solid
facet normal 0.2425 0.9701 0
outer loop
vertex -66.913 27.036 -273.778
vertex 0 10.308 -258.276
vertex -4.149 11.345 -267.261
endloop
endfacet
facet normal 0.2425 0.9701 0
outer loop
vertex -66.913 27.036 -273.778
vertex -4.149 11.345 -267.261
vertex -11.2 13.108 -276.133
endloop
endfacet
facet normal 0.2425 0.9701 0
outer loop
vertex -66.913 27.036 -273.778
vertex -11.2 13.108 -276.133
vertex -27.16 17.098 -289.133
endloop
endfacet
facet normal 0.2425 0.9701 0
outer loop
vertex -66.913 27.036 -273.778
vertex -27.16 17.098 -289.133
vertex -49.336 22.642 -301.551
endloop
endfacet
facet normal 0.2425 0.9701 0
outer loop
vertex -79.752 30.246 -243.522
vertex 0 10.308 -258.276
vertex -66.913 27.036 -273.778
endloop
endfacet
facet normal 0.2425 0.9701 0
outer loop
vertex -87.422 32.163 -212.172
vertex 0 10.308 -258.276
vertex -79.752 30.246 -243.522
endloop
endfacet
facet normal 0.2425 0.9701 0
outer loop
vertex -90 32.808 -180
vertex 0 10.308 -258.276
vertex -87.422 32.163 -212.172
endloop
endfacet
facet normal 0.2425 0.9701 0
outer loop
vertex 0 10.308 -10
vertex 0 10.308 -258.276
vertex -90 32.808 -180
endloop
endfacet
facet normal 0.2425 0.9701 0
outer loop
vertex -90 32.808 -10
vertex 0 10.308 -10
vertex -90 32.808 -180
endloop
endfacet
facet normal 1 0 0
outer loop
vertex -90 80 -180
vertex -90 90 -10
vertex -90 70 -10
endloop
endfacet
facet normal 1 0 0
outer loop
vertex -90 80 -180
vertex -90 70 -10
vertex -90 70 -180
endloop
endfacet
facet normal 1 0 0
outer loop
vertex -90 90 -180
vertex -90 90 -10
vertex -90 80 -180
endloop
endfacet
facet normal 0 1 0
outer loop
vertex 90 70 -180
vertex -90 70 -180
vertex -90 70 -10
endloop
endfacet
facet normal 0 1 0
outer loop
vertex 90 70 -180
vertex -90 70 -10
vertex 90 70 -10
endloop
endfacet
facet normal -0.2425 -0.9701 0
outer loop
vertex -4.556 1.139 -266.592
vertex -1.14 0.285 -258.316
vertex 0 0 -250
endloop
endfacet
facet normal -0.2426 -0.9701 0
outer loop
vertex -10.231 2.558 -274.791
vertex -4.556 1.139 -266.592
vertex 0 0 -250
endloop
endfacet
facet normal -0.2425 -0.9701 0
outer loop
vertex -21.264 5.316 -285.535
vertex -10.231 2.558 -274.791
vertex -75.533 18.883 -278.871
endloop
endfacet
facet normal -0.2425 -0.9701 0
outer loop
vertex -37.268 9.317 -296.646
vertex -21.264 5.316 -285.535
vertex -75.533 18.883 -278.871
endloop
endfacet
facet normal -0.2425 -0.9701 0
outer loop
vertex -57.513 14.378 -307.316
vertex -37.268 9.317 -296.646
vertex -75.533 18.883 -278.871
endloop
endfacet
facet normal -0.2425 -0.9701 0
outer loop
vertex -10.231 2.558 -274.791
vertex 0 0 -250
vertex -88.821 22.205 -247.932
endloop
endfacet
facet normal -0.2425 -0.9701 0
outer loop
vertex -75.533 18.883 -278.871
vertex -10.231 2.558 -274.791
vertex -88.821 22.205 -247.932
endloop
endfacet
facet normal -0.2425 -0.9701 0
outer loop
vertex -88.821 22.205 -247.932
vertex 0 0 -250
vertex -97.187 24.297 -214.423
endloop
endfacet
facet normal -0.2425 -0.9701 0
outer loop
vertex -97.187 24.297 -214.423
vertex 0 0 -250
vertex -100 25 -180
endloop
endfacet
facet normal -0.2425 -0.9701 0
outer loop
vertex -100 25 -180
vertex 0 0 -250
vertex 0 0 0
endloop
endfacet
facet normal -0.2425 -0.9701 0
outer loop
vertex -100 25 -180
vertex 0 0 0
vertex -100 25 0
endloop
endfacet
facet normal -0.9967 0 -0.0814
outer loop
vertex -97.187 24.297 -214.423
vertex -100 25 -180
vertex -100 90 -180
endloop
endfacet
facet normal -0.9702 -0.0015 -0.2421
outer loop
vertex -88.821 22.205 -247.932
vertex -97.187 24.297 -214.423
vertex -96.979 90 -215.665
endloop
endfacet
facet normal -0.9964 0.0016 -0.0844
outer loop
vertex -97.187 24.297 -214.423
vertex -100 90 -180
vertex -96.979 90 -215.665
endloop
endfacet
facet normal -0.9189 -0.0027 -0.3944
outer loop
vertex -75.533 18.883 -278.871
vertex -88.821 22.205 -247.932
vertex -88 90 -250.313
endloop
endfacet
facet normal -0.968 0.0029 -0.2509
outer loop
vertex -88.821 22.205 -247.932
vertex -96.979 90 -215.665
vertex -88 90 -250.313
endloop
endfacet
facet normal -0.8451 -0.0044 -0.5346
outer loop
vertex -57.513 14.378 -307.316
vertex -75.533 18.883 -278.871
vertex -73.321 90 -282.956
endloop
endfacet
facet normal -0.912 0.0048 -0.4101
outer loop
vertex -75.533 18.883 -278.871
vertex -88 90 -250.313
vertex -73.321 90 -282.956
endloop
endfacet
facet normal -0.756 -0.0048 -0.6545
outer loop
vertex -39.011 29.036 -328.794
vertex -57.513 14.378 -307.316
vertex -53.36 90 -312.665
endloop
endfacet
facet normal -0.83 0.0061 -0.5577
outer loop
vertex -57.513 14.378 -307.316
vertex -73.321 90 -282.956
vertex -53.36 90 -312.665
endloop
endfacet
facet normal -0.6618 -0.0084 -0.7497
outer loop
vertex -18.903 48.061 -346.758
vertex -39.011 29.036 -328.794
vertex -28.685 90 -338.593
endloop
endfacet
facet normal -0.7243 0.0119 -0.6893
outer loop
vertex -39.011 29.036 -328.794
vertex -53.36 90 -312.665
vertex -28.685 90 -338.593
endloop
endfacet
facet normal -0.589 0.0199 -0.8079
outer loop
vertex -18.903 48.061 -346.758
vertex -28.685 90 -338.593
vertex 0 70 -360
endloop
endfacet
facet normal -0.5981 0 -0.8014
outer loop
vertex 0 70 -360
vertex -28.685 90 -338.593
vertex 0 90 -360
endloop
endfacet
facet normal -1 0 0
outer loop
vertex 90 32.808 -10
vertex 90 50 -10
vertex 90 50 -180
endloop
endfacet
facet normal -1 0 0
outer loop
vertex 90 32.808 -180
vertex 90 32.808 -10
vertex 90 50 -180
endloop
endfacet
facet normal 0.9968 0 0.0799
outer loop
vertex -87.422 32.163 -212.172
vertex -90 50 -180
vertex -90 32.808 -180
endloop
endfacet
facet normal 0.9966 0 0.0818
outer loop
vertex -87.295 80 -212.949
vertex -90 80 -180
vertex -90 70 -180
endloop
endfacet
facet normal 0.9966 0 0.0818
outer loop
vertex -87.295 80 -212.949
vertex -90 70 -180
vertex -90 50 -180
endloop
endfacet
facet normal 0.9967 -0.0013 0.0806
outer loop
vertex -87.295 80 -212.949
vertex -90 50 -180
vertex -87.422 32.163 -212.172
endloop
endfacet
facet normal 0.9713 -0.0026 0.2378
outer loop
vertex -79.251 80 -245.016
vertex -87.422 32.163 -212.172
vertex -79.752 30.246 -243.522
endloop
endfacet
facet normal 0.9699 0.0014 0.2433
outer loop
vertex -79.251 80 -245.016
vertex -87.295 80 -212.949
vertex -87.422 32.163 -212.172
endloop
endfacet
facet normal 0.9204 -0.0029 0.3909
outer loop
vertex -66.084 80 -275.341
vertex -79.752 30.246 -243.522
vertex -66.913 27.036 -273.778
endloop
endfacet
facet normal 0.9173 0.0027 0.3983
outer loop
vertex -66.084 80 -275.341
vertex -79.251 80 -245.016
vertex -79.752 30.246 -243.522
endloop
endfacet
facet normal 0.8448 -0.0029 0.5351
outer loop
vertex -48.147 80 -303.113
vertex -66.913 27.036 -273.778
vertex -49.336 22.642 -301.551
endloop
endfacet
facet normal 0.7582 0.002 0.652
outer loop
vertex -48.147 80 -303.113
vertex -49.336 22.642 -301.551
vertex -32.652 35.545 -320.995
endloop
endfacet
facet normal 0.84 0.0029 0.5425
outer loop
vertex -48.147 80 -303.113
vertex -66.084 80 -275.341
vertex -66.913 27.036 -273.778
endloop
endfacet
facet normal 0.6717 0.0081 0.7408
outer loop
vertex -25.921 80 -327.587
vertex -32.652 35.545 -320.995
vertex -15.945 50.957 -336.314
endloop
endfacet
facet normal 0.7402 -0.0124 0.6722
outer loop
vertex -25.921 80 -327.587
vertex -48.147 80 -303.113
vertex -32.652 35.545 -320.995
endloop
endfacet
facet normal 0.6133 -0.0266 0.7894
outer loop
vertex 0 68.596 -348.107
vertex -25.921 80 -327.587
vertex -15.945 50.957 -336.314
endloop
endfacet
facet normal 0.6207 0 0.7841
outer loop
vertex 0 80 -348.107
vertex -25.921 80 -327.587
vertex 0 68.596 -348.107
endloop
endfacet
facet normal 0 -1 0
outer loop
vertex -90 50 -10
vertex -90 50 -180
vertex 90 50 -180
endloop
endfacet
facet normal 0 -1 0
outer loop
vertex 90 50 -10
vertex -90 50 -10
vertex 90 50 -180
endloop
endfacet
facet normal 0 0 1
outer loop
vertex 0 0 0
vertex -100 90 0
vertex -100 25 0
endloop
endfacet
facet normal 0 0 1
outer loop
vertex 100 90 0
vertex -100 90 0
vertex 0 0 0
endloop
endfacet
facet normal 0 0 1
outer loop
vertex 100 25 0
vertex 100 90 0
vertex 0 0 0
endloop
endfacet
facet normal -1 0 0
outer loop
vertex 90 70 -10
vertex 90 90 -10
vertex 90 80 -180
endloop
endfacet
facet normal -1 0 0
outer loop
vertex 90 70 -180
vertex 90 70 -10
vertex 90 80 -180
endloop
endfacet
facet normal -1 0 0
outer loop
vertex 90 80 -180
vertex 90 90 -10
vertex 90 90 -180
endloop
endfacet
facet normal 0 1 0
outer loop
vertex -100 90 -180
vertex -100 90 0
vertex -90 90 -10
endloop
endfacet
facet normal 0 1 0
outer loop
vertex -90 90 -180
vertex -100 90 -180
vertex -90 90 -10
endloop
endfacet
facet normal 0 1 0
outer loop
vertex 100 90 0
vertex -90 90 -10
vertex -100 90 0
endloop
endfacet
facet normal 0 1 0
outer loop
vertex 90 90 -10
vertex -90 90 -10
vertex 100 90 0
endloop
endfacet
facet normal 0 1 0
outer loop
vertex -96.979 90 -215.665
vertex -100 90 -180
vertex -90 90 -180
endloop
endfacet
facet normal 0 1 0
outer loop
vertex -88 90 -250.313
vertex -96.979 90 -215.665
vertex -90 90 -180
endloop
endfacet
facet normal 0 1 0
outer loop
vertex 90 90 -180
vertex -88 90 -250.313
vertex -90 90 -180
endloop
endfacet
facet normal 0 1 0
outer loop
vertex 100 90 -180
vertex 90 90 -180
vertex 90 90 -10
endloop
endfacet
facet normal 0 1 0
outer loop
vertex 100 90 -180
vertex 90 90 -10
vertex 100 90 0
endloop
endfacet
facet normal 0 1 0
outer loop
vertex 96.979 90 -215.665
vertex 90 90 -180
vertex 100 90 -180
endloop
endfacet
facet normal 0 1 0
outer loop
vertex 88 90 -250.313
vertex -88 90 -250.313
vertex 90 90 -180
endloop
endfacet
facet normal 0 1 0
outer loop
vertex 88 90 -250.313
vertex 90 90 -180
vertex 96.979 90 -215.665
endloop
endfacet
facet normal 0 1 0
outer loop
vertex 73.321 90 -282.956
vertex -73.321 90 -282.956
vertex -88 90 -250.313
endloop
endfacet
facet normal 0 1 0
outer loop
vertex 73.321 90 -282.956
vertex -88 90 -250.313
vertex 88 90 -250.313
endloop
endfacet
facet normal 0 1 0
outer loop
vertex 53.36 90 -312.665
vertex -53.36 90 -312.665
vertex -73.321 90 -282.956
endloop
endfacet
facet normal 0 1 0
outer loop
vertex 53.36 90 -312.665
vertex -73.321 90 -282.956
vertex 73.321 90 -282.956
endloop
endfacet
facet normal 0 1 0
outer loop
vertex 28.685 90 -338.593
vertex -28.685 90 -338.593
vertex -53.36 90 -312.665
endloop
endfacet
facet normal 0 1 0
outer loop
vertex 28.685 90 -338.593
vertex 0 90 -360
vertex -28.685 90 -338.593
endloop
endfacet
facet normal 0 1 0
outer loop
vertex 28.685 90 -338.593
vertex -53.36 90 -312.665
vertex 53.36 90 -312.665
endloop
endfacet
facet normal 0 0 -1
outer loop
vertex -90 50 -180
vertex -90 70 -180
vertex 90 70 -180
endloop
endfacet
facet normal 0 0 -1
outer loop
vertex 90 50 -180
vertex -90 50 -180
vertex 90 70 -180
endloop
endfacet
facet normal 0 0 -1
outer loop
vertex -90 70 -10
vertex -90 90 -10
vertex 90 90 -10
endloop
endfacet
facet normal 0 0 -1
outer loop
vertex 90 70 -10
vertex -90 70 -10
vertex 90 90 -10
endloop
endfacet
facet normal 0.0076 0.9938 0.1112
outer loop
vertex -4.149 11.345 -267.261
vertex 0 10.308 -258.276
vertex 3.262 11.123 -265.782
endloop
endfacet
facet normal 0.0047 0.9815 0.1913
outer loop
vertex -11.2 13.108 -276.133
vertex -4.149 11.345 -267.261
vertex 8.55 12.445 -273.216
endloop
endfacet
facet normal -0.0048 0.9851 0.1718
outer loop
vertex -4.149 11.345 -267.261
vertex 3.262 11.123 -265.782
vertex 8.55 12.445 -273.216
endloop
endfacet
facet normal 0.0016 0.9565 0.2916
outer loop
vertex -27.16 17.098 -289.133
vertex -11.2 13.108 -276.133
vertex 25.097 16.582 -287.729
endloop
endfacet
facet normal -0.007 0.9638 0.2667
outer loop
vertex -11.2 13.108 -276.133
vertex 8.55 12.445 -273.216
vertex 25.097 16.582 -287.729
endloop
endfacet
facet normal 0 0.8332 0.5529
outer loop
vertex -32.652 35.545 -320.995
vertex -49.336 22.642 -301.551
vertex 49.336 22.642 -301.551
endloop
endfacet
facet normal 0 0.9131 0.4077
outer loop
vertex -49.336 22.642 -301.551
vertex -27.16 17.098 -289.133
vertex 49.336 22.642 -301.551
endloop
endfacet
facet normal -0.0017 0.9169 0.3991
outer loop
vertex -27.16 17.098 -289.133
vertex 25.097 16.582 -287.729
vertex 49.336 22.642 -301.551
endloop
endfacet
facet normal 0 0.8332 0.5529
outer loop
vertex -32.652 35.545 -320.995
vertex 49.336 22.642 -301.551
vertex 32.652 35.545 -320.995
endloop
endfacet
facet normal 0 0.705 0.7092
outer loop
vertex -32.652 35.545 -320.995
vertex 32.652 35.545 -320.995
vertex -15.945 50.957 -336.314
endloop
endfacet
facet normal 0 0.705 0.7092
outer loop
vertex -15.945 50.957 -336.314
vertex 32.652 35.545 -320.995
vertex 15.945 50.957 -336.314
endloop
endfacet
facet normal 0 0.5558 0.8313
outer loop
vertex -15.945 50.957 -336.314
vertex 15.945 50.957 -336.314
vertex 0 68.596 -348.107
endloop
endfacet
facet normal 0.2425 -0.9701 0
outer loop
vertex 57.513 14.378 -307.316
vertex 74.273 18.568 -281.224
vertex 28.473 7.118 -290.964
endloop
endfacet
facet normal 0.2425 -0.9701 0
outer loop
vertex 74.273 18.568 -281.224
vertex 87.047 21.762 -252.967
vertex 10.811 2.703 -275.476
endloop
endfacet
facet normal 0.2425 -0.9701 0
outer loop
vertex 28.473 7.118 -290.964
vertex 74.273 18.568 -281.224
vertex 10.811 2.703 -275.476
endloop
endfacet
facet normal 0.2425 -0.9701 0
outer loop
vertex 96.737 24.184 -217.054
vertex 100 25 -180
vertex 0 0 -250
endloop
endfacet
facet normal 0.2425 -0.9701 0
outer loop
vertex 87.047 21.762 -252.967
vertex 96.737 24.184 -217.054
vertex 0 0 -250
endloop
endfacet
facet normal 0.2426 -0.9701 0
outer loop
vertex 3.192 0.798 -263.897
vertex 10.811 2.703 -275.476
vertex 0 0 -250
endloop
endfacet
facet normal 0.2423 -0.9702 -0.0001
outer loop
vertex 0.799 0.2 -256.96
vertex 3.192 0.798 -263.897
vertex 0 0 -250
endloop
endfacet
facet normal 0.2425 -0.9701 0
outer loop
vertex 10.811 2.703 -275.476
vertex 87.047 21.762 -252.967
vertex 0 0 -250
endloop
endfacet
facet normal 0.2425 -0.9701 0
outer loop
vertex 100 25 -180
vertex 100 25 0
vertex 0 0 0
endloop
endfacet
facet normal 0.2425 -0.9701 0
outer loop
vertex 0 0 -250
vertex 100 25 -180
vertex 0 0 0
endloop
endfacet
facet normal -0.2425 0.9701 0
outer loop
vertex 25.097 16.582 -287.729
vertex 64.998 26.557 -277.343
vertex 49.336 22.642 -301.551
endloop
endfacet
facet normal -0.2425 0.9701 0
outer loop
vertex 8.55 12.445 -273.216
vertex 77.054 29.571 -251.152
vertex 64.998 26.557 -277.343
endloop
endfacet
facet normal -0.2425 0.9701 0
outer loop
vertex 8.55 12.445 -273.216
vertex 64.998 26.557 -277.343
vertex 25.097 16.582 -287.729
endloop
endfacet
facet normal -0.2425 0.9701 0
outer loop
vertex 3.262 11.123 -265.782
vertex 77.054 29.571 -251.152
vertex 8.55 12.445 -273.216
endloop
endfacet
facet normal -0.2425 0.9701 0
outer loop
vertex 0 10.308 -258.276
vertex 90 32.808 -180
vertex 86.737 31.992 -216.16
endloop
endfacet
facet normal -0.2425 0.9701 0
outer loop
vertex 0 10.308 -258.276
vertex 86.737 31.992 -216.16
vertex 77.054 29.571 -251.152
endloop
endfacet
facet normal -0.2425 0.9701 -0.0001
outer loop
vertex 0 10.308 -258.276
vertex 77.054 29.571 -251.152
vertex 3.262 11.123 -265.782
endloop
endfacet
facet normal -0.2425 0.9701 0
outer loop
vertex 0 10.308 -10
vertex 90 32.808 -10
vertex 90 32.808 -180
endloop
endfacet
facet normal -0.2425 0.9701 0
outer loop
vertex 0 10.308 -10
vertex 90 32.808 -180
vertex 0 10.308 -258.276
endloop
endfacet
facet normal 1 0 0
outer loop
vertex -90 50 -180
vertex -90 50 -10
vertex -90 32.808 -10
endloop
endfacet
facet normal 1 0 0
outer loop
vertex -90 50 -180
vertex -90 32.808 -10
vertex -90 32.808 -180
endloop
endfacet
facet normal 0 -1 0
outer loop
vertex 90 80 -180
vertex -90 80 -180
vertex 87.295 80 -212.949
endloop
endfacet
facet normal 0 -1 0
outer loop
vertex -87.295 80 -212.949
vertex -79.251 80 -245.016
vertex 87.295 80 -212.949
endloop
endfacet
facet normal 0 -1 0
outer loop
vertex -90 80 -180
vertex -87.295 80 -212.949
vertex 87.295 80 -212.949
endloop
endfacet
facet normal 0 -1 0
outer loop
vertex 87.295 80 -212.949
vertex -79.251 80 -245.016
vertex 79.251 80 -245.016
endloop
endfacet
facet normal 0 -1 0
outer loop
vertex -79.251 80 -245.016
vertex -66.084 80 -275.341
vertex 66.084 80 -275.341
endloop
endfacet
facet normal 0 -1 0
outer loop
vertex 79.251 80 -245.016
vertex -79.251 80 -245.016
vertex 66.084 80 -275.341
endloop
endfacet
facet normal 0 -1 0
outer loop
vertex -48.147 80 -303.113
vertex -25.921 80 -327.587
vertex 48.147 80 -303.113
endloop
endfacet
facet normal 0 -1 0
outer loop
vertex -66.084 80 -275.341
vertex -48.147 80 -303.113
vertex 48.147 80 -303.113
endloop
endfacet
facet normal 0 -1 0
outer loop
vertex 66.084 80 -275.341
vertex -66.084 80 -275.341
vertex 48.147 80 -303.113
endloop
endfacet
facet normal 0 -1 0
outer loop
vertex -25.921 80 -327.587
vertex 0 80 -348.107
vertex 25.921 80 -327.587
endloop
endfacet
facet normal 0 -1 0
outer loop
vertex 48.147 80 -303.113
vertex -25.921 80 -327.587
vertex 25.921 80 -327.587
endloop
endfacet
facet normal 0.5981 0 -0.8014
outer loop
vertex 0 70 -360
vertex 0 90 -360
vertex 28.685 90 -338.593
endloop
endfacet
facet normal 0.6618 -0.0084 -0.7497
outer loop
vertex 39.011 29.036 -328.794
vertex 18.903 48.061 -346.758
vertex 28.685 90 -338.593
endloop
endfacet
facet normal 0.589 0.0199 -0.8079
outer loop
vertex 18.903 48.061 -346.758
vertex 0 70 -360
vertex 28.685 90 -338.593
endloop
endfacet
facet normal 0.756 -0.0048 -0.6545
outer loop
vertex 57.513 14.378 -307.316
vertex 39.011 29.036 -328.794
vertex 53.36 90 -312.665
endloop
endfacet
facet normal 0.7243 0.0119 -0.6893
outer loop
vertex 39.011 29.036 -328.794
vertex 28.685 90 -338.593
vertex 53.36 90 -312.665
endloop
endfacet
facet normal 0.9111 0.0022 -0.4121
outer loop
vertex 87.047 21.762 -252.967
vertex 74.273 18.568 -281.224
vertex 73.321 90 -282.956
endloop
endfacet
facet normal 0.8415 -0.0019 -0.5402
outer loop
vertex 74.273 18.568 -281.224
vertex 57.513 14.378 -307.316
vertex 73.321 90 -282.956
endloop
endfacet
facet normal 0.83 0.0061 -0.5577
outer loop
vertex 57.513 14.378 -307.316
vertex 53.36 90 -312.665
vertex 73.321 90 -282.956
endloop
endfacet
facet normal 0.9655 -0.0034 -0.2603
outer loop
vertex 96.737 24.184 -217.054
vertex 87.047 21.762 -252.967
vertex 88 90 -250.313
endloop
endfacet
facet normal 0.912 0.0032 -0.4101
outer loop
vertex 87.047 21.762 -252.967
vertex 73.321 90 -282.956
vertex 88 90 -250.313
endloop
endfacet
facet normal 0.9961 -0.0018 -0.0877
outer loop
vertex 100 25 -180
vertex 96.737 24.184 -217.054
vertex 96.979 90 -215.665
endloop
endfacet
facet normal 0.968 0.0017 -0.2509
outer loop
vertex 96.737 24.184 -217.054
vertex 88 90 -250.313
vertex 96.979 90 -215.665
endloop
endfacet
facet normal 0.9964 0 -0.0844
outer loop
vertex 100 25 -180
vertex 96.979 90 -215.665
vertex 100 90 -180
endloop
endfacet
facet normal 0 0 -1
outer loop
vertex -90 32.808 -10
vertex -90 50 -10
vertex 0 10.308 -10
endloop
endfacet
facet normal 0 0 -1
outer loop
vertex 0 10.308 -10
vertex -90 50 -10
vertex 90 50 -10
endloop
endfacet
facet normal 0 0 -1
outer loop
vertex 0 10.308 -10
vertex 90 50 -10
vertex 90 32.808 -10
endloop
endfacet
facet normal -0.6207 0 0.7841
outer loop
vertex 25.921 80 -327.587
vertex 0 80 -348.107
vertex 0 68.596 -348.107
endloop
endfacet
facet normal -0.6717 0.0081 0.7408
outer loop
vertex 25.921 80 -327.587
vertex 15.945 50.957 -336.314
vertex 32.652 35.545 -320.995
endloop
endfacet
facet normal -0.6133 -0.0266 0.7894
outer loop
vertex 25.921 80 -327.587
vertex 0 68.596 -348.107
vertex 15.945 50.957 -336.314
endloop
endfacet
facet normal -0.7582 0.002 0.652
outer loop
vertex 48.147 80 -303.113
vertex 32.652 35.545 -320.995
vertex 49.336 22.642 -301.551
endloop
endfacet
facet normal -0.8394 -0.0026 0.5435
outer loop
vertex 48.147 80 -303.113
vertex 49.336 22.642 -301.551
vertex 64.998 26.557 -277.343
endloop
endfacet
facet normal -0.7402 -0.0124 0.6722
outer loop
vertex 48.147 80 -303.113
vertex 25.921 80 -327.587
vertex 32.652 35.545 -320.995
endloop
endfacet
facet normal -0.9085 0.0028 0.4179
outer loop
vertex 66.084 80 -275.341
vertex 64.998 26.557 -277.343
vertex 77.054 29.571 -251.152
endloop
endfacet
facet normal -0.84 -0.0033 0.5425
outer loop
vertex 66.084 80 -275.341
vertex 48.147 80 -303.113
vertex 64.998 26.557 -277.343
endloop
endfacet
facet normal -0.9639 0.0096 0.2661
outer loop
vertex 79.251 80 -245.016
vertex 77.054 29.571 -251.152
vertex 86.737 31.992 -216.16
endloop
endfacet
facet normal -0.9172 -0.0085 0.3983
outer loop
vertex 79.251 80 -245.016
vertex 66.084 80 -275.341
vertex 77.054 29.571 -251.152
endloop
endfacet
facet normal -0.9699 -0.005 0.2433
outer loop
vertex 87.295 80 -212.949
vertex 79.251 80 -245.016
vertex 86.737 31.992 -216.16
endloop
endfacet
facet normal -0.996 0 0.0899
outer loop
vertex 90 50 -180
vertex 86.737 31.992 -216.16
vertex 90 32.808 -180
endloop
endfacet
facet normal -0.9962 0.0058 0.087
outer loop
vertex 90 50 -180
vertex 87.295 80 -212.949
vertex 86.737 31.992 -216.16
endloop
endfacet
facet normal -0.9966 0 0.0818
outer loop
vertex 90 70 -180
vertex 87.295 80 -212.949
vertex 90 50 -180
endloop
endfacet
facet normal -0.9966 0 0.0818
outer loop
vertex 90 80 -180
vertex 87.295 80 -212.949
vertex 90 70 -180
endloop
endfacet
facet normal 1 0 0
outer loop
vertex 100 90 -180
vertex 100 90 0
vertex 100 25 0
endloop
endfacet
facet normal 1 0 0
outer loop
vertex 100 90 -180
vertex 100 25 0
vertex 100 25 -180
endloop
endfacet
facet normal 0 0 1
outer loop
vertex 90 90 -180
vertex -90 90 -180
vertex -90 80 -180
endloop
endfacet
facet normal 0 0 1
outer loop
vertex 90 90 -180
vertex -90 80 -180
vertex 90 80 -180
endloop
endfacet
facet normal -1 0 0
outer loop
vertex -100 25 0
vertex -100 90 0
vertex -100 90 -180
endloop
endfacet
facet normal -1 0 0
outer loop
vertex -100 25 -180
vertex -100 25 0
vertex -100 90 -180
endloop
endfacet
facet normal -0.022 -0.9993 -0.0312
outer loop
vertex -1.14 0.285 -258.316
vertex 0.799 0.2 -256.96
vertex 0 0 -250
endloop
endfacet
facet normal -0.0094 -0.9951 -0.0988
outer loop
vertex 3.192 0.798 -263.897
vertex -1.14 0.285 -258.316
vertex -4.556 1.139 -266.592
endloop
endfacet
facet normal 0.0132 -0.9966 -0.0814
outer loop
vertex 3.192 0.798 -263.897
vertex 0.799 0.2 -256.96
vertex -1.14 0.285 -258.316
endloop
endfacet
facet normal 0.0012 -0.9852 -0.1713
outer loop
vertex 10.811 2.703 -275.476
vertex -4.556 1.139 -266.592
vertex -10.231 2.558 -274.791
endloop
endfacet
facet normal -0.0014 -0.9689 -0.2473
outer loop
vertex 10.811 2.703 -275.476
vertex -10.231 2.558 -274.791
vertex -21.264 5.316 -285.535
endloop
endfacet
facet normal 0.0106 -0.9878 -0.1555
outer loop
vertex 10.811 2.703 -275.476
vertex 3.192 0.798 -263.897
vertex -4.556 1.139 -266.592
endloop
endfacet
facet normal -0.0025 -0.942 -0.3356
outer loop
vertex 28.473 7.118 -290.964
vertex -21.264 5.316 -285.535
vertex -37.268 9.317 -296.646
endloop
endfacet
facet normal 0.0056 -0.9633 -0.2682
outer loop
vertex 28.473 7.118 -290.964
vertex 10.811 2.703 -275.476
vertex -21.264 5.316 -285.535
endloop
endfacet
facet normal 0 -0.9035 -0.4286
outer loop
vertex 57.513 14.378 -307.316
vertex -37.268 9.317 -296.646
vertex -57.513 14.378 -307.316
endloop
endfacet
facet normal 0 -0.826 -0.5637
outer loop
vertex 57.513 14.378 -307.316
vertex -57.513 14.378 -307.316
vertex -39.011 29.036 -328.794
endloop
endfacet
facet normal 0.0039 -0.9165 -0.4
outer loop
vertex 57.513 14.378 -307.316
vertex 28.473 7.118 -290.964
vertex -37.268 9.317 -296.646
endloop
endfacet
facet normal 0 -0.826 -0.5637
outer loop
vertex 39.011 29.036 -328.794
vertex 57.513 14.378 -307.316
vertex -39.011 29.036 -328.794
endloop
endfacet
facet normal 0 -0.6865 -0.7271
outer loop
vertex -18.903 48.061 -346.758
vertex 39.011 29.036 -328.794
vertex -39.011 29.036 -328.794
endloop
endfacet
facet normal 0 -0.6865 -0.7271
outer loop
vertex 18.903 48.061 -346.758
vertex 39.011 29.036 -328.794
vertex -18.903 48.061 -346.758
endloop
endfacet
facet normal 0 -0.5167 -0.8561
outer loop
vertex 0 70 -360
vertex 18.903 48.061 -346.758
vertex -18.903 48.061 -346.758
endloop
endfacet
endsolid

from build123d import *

# Parameters (mm, degrees)
BOSS_EXTRUDE1_DEPTH = 100
CUT_EXTRUDE1_DEPTH  = 385.317577012
CUT_EXTRUDE2_DEPTH  = 385.317577012
SHELL1_T            = -10
SKETCH5_W           = 180
SKETCH5_H           = 170
BOSS_EXTRUDE4_DEPTH = 40
SKETCH5_3_W         = 180
SKETCH5_3_H         = 170
CUT_EXTRUDE4_DEPTH  = 20
BOSS_EXTRUDE5_DEPTH = 10


with BuildPart() as part:
    # Sketch2 → Boss-Extrude1 (new, symmetric)
    with BuildSketch(Plane(origin=(0, 0, 0), x_dir=(0, 0, -1), z_dir=(1, 0, 0))):
        with BuildLine():
            Line((0, 0), (250, 0))
            ThreePointArc((250, 0), (315.192024052, 18.983962204), (360, 70))
            Line((360, 70), (360, 90))
            Line((360, 90), (0, 90))
            Line((0, 90), (0, 0))
        make_face()
    extrude(amount=BOSS_EXTRUDE1_DEPTH, both=True)

    # Sketch3 → Cut-Extrude1 (cut, through all)
    with BuildSketch(Plane.XY):
        Polygon((0, 0), (-100, 25), (-100, 0), align=None)
        Polygon((100, 0), (100, 25), (0, 0), align=None)
    extrude(amount=-CUT_EXTRUDE1_DEPTH, mode=Mode.SUBTRACT)

    # Sketch4 → Cut-Extrude2 (cut, through all)
    with BuildSketch(Plane(origin=(0, 90, 0), x_dir=(1, 0, 0), z_dir=(0, 1, 0))):
        with BuildLine():
            Line((100, 360), (0, 360))
            ThreePointArc((0, 360), (73.321342538, 282.95630141), (100, 180))
            Line((100, 180), (100, 360))
        make_face()
        with BuildLine():
            Line((-100, 360), (-100, 180))
            ThreePointArc((-100, 180), (-73.321342538, 282.95630141), (0, 360))
            Line((0, 360), (-100, 360))
        make_face()
    extrude(amount=-CUT_EXTRUDE2_DEPTH, mode=Mode.SUBTRACT)

    # Shell1
    shell1_openings = [part.faces().sort_by_distance(p)[0] for p in [
        (0, 90, -156.338581153),
    ]]
    offset(amount=SHELL1_T, openings=shell1_openings)

    # Sketch5 → Boss-Extrude4 (add)
    with BuildSketch(Plane(origin=(0, 90, 0), x_dir=(1, 0, 0), z_dir=(0, 1, 0))):
        with Locations((0, 95)):
            Rectangle(SKETCH5_W, SKETCH5_H)
    extrude(amount=-BOSS_EXTRUDE4_DEPTH)

    # Sketch5<3> → Cut-Extrude4 (cut)
    with BuildSketch(Plane(origin=(0, 90, 0), x_dir=(1, 0, 0), z_dir=(0, 1, 0))):
        with Locations((0, 95)):
            Rectangle(SKETCH5_3_W, SKETCH5_3_H)
    extrude(amount=-CUT_EXTRUDE4_DEPTH, mode=Mode.SUBTRACT)

    # Sketch8 → Boss-Extrude5 (add)
    with BuildSketch(Plane(origin=(0, 90, 0), x_dir=(1, 0, 0), z_dir=(0, 1, 0))):
        with BuildLine():
            Line((-90, 180), (90, 180))
            ThreePointArc((90, 180), (66.084249725, 275.341491492), (0, 348.107108713))
            ThreePointArc((0, 348.107108713), (-66.084249725, 275.341491492), (-90, 180))
        make_face()
    extrude(amount=-BOSS_EXTRUDE5_DEPTH)


solid = part.part
